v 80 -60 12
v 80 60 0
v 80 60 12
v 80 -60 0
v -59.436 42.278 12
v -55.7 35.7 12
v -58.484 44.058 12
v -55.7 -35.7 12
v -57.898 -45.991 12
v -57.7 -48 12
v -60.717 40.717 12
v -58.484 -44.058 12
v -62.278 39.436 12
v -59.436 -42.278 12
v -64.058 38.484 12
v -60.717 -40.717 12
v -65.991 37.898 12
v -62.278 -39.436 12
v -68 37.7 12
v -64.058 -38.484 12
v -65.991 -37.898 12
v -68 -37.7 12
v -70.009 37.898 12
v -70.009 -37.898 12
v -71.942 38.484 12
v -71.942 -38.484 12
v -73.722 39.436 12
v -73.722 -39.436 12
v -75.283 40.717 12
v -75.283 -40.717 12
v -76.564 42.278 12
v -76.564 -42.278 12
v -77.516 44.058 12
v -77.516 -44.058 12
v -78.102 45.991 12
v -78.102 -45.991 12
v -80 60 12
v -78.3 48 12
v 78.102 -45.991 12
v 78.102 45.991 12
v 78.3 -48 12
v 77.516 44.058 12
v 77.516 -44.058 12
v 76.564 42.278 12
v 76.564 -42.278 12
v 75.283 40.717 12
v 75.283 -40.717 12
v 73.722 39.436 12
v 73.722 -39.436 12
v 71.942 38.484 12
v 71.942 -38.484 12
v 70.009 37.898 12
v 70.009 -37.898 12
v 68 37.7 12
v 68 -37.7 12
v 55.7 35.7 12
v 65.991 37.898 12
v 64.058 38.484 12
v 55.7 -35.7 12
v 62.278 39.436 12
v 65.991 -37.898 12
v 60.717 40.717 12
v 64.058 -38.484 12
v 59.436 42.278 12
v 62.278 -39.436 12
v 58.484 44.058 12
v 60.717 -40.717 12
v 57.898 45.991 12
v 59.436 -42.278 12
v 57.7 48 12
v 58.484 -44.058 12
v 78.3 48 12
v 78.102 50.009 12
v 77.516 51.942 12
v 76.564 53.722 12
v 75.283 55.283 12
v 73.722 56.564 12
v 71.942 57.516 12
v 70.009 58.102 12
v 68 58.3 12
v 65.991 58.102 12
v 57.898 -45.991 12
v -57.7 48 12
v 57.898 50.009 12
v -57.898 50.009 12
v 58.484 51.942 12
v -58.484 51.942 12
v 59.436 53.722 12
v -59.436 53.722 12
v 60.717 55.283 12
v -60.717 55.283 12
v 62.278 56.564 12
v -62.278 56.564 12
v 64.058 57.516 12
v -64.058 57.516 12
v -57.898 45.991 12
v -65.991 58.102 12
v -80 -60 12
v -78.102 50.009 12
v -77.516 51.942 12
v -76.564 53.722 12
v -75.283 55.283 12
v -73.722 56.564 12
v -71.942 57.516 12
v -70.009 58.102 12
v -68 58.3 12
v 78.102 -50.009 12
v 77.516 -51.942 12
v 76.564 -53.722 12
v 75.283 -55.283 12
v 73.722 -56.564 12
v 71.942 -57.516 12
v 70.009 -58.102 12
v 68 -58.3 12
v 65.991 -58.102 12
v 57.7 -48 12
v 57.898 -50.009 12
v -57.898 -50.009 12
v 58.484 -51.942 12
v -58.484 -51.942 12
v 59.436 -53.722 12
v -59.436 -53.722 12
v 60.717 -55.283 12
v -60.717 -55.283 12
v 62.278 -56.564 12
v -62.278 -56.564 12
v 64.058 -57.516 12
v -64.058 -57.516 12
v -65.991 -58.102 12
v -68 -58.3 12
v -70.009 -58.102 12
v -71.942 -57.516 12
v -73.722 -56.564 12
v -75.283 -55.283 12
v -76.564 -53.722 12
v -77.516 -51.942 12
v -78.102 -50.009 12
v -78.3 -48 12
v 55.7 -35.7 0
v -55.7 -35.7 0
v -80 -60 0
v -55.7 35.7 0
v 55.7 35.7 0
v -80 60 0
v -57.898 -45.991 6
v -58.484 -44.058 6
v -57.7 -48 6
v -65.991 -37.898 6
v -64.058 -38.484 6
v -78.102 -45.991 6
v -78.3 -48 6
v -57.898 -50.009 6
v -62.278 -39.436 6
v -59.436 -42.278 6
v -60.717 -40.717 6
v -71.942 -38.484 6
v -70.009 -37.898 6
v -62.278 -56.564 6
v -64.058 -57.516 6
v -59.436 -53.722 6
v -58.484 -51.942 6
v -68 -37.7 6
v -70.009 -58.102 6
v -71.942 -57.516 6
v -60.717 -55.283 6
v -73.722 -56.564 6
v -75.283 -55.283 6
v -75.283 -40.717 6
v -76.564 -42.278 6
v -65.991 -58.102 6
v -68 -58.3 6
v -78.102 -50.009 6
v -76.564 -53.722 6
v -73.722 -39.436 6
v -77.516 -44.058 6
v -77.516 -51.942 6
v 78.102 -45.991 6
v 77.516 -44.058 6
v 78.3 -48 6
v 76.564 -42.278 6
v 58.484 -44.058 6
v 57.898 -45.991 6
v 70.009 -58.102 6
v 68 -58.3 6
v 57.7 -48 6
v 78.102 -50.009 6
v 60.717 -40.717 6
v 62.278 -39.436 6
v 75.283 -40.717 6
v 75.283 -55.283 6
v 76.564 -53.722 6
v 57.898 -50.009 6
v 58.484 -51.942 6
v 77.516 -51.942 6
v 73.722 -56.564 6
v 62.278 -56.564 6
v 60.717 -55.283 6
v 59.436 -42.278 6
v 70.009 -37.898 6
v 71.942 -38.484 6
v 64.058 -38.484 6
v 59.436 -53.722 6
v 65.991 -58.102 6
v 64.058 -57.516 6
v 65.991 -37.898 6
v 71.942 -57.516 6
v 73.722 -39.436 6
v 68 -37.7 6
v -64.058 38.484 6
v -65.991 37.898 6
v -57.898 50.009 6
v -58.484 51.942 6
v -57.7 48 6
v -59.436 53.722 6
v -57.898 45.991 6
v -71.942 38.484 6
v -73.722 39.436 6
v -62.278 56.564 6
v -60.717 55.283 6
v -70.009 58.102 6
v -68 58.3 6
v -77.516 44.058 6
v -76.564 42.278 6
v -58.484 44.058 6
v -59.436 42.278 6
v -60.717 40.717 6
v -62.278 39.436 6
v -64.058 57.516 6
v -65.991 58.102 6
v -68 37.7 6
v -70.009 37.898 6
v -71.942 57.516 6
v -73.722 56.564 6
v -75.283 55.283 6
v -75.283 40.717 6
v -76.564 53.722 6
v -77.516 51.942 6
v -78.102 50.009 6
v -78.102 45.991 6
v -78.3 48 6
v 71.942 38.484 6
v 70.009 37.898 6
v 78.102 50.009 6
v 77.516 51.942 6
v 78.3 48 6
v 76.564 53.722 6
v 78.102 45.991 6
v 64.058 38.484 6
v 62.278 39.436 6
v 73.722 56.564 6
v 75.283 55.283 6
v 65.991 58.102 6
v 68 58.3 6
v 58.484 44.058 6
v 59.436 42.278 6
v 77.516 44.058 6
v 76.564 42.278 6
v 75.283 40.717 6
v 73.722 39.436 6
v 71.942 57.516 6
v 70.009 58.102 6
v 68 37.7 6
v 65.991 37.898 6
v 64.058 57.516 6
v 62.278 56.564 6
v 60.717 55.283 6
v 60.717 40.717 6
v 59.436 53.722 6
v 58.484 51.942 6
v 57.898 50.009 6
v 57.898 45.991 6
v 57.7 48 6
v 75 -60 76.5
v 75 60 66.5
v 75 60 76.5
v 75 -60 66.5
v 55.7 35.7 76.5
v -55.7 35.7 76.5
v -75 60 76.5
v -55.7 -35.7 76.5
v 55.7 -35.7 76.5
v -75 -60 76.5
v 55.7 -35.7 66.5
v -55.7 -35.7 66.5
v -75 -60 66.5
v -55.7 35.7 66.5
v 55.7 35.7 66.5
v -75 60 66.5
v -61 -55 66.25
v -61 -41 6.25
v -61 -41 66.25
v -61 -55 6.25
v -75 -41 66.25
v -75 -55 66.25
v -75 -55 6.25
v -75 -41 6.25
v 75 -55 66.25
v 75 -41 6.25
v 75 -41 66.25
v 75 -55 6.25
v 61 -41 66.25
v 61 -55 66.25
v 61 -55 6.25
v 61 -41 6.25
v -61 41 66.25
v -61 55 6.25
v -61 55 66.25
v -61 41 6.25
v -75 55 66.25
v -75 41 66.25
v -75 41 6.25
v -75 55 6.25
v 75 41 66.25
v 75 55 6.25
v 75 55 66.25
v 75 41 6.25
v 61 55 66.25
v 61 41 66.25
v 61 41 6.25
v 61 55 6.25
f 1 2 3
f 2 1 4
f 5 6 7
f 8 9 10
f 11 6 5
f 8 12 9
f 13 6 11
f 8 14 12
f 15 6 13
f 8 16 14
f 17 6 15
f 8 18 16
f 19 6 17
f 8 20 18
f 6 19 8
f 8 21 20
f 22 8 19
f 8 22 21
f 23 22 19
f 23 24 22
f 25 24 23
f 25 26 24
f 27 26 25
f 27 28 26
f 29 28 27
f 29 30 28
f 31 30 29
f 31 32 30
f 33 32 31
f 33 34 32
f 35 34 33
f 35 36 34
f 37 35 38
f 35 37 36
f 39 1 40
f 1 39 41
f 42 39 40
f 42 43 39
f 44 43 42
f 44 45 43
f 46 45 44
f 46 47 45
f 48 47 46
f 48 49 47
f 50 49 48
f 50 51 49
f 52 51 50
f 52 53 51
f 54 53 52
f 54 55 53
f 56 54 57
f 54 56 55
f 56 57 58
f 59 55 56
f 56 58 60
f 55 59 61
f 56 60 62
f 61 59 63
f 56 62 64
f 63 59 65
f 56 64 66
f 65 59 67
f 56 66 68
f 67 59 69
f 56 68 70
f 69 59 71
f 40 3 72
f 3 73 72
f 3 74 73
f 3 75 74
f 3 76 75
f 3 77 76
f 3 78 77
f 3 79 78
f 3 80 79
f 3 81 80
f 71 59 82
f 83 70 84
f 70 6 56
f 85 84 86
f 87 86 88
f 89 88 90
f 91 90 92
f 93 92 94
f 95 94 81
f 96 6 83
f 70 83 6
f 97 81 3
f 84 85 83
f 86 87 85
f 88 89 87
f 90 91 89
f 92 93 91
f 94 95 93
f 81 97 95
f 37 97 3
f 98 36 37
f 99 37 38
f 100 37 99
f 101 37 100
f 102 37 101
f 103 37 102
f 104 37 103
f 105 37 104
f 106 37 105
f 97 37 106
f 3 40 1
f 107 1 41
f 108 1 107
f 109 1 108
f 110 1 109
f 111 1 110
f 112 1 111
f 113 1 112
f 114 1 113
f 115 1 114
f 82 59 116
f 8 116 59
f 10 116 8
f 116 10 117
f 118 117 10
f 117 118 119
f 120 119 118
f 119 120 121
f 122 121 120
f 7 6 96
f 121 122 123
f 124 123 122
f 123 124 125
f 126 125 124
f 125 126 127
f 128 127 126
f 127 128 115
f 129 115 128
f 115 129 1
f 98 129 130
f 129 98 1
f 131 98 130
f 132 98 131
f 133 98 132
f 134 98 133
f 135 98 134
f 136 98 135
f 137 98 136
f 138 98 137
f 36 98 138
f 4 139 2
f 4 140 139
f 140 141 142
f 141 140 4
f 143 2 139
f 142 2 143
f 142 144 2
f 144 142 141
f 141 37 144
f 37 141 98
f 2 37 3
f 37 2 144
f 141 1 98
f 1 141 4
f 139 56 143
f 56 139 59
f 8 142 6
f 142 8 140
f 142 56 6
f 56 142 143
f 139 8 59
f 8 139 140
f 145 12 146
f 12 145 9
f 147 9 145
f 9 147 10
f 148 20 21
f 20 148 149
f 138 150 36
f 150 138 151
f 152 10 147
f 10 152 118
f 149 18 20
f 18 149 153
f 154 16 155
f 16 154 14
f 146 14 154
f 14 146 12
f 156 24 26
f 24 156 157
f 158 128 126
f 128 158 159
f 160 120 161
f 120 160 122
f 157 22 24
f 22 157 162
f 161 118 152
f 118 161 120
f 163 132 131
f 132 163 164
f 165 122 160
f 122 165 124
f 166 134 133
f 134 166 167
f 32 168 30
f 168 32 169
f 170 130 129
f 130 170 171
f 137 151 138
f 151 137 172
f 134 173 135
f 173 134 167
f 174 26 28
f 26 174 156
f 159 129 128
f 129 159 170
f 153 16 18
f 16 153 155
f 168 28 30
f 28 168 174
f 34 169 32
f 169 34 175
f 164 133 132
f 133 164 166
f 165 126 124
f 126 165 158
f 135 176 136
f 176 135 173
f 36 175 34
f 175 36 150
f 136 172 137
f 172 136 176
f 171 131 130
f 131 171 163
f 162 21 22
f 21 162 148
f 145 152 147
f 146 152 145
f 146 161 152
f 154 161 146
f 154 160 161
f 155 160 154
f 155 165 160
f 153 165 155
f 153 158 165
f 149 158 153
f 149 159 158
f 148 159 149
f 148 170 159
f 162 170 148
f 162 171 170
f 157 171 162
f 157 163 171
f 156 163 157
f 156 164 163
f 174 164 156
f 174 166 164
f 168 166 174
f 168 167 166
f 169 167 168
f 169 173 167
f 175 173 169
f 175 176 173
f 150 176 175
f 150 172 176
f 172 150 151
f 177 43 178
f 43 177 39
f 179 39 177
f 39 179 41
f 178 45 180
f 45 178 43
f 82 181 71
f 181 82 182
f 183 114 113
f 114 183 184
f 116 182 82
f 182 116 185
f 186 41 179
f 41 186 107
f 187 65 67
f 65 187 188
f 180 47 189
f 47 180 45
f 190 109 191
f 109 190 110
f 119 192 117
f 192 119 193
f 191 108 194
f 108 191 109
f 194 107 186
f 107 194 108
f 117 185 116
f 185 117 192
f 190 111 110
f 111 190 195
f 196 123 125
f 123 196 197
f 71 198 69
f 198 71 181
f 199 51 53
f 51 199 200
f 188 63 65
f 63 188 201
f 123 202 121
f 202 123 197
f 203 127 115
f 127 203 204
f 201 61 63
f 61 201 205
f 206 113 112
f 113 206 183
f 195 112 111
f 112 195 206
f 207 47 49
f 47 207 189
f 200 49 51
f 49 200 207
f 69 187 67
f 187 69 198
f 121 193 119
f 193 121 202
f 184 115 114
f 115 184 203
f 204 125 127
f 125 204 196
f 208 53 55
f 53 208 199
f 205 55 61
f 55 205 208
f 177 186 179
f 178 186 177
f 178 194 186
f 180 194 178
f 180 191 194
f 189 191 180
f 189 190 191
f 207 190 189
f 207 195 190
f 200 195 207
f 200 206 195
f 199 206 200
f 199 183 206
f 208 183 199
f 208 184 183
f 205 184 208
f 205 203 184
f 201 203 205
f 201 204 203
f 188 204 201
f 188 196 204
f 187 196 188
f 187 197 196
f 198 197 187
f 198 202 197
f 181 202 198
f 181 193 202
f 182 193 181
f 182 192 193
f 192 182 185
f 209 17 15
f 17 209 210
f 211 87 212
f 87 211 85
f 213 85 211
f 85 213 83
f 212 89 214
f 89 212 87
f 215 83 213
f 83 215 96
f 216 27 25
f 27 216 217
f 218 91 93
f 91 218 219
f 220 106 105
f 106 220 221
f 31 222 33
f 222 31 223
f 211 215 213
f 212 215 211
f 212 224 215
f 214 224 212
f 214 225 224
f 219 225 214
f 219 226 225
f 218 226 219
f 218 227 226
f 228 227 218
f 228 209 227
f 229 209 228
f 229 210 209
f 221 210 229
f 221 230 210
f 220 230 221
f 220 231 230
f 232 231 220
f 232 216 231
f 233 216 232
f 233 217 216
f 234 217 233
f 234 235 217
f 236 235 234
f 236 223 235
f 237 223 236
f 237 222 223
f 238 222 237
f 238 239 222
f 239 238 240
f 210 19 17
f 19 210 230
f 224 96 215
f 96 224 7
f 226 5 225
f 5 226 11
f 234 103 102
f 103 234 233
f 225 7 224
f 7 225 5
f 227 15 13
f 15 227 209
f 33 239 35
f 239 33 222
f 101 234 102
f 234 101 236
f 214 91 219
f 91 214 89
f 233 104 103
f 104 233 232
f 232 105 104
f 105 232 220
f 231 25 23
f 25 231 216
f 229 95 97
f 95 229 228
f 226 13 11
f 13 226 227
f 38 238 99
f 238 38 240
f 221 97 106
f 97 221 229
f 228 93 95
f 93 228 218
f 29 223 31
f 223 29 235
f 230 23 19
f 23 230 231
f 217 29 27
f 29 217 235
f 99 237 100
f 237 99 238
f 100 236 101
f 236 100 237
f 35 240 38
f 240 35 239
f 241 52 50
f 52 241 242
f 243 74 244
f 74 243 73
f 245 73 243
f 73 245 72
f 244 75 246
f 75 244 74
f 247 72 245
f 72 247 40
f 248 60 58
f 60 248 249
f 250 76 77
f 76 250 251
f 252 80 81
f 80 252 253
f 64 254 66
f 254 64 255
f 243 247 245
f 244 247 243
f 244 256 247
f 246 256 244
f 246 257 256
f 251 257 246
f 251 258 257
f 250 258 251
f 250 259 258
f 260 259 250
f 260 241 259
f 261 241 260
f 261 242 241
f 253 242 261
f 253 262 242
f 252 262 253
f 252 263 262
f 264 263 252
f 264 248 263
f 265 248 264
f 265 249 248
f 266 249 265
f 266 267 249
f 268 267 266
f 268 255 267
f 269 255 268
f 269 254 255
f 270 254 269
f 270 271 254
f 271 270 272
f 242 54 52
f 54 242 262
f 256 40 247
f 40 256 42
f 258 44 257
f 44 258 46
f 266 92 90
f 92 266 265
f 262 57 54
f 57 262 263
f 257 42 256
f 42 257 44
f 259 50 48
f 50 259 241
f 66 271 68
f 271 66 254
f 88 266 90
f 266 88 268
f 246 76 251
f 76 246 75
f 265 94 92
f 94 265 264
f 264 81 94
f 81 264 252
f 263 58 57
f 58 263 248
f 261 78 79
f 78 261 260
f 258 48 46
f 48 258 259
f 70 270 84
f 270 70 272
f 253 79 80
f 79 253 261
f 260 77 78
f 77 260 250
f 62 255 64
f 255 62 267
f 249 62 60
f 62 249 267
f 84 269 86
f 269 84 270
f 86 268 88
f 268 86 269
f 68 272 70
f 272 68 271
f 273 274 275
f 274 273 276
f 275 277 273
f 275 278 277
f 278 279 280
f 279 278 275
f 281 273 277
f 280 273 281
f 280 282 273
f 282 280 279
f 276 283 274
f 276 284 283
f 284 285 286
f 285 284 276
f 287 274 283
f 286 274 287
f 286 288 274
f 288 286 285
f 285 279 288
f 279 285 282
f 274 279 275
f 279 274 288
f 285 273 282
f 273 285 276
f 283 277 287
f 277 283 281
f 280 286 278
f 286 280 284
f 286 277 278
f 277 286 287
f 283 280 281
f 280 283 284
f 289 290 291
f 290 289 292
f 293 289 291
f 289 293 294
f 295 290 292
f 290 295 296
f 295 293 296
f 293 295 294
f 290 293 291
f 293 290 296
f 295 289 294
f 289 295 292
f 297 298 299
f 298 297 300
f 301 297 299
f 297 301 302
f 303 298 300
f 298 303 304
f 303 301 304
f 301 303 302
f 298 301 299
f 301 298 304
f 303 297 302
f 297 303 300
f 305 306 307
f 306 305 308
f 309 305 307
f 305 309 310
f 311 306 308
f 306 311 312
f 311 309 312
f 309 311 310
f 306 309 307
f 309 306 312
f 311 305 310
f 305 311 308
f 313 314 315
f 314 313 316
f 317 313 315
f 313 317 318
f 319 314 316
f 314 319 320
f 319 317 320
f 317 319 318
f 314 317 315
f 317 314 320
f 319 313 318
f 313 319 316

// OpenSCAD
$fn = 32;

// ------------------------------------------------------------------------
// Frame cube: base 160 x 120 mm, posts 60 mm tall
// Every part is its own module, assembly() places every instance.
// ------------------------------------------------------------------------

// --- part 1 ---
module base_frame() {
  difference() {
    translate([-80, -60, 0]) cube([160, 120, 12]);
    translate([-55.7, -35.7, -1]) cube([111.4, 71.4, 14]);
    translate([-68, -48, 6]) cylinder(h = 7, d = 20.6);
    translate([68, -48, 6]) cylinder(h = 7, d = 20.6);
    translate([-68, 48, 6]) cylinder(h = 7, d = 20.6);
    translate([68, 48, 6]) cylinder(h = 7, d = 20.6);
  }
}

// --- part 2 ---
module corner_post() {
  translate([-7, -7, 0]) cube([14, 14, 60]);
}

// --- part 3 ---
module top_frame() {
  difference() {
    translate([-75, -60, 0]) cube([150, 120, 10]);
    translate([-55.7, -35.7, -1]) cube([111.4, 71.4, 12]);
  }
}

// --- assembly ---
module assembly() {
  color([0.80, 0.24, 0.20]) translate([0, 0, 0]) rotate([0, 0, 0]) base_frame();
  color([0.20, 0.45, 0.75]) translate([-68, -48, 6.25]) rotate([0, 0, 0]) corner_post();
  color([0.25, 0.62, 0.32]) translate([68, -48, 6.25]) rotate([0, 0, 0]) corner_post();
  color([0.92, 0.70, 0.18]) translate([-68, 48, 6.25]) rotate([0, 0, 0]) corner_post();
  color([0.58, 0.35, 0.70]) translate([68, 48, 6.25]) rotate([0, 0, 0]) corner_post();
  color([0.16, 0.66, 0.66]) translate([0, 0, 66.5]) rotate([0, 0, 0]) top_frame();
}

assembly();
